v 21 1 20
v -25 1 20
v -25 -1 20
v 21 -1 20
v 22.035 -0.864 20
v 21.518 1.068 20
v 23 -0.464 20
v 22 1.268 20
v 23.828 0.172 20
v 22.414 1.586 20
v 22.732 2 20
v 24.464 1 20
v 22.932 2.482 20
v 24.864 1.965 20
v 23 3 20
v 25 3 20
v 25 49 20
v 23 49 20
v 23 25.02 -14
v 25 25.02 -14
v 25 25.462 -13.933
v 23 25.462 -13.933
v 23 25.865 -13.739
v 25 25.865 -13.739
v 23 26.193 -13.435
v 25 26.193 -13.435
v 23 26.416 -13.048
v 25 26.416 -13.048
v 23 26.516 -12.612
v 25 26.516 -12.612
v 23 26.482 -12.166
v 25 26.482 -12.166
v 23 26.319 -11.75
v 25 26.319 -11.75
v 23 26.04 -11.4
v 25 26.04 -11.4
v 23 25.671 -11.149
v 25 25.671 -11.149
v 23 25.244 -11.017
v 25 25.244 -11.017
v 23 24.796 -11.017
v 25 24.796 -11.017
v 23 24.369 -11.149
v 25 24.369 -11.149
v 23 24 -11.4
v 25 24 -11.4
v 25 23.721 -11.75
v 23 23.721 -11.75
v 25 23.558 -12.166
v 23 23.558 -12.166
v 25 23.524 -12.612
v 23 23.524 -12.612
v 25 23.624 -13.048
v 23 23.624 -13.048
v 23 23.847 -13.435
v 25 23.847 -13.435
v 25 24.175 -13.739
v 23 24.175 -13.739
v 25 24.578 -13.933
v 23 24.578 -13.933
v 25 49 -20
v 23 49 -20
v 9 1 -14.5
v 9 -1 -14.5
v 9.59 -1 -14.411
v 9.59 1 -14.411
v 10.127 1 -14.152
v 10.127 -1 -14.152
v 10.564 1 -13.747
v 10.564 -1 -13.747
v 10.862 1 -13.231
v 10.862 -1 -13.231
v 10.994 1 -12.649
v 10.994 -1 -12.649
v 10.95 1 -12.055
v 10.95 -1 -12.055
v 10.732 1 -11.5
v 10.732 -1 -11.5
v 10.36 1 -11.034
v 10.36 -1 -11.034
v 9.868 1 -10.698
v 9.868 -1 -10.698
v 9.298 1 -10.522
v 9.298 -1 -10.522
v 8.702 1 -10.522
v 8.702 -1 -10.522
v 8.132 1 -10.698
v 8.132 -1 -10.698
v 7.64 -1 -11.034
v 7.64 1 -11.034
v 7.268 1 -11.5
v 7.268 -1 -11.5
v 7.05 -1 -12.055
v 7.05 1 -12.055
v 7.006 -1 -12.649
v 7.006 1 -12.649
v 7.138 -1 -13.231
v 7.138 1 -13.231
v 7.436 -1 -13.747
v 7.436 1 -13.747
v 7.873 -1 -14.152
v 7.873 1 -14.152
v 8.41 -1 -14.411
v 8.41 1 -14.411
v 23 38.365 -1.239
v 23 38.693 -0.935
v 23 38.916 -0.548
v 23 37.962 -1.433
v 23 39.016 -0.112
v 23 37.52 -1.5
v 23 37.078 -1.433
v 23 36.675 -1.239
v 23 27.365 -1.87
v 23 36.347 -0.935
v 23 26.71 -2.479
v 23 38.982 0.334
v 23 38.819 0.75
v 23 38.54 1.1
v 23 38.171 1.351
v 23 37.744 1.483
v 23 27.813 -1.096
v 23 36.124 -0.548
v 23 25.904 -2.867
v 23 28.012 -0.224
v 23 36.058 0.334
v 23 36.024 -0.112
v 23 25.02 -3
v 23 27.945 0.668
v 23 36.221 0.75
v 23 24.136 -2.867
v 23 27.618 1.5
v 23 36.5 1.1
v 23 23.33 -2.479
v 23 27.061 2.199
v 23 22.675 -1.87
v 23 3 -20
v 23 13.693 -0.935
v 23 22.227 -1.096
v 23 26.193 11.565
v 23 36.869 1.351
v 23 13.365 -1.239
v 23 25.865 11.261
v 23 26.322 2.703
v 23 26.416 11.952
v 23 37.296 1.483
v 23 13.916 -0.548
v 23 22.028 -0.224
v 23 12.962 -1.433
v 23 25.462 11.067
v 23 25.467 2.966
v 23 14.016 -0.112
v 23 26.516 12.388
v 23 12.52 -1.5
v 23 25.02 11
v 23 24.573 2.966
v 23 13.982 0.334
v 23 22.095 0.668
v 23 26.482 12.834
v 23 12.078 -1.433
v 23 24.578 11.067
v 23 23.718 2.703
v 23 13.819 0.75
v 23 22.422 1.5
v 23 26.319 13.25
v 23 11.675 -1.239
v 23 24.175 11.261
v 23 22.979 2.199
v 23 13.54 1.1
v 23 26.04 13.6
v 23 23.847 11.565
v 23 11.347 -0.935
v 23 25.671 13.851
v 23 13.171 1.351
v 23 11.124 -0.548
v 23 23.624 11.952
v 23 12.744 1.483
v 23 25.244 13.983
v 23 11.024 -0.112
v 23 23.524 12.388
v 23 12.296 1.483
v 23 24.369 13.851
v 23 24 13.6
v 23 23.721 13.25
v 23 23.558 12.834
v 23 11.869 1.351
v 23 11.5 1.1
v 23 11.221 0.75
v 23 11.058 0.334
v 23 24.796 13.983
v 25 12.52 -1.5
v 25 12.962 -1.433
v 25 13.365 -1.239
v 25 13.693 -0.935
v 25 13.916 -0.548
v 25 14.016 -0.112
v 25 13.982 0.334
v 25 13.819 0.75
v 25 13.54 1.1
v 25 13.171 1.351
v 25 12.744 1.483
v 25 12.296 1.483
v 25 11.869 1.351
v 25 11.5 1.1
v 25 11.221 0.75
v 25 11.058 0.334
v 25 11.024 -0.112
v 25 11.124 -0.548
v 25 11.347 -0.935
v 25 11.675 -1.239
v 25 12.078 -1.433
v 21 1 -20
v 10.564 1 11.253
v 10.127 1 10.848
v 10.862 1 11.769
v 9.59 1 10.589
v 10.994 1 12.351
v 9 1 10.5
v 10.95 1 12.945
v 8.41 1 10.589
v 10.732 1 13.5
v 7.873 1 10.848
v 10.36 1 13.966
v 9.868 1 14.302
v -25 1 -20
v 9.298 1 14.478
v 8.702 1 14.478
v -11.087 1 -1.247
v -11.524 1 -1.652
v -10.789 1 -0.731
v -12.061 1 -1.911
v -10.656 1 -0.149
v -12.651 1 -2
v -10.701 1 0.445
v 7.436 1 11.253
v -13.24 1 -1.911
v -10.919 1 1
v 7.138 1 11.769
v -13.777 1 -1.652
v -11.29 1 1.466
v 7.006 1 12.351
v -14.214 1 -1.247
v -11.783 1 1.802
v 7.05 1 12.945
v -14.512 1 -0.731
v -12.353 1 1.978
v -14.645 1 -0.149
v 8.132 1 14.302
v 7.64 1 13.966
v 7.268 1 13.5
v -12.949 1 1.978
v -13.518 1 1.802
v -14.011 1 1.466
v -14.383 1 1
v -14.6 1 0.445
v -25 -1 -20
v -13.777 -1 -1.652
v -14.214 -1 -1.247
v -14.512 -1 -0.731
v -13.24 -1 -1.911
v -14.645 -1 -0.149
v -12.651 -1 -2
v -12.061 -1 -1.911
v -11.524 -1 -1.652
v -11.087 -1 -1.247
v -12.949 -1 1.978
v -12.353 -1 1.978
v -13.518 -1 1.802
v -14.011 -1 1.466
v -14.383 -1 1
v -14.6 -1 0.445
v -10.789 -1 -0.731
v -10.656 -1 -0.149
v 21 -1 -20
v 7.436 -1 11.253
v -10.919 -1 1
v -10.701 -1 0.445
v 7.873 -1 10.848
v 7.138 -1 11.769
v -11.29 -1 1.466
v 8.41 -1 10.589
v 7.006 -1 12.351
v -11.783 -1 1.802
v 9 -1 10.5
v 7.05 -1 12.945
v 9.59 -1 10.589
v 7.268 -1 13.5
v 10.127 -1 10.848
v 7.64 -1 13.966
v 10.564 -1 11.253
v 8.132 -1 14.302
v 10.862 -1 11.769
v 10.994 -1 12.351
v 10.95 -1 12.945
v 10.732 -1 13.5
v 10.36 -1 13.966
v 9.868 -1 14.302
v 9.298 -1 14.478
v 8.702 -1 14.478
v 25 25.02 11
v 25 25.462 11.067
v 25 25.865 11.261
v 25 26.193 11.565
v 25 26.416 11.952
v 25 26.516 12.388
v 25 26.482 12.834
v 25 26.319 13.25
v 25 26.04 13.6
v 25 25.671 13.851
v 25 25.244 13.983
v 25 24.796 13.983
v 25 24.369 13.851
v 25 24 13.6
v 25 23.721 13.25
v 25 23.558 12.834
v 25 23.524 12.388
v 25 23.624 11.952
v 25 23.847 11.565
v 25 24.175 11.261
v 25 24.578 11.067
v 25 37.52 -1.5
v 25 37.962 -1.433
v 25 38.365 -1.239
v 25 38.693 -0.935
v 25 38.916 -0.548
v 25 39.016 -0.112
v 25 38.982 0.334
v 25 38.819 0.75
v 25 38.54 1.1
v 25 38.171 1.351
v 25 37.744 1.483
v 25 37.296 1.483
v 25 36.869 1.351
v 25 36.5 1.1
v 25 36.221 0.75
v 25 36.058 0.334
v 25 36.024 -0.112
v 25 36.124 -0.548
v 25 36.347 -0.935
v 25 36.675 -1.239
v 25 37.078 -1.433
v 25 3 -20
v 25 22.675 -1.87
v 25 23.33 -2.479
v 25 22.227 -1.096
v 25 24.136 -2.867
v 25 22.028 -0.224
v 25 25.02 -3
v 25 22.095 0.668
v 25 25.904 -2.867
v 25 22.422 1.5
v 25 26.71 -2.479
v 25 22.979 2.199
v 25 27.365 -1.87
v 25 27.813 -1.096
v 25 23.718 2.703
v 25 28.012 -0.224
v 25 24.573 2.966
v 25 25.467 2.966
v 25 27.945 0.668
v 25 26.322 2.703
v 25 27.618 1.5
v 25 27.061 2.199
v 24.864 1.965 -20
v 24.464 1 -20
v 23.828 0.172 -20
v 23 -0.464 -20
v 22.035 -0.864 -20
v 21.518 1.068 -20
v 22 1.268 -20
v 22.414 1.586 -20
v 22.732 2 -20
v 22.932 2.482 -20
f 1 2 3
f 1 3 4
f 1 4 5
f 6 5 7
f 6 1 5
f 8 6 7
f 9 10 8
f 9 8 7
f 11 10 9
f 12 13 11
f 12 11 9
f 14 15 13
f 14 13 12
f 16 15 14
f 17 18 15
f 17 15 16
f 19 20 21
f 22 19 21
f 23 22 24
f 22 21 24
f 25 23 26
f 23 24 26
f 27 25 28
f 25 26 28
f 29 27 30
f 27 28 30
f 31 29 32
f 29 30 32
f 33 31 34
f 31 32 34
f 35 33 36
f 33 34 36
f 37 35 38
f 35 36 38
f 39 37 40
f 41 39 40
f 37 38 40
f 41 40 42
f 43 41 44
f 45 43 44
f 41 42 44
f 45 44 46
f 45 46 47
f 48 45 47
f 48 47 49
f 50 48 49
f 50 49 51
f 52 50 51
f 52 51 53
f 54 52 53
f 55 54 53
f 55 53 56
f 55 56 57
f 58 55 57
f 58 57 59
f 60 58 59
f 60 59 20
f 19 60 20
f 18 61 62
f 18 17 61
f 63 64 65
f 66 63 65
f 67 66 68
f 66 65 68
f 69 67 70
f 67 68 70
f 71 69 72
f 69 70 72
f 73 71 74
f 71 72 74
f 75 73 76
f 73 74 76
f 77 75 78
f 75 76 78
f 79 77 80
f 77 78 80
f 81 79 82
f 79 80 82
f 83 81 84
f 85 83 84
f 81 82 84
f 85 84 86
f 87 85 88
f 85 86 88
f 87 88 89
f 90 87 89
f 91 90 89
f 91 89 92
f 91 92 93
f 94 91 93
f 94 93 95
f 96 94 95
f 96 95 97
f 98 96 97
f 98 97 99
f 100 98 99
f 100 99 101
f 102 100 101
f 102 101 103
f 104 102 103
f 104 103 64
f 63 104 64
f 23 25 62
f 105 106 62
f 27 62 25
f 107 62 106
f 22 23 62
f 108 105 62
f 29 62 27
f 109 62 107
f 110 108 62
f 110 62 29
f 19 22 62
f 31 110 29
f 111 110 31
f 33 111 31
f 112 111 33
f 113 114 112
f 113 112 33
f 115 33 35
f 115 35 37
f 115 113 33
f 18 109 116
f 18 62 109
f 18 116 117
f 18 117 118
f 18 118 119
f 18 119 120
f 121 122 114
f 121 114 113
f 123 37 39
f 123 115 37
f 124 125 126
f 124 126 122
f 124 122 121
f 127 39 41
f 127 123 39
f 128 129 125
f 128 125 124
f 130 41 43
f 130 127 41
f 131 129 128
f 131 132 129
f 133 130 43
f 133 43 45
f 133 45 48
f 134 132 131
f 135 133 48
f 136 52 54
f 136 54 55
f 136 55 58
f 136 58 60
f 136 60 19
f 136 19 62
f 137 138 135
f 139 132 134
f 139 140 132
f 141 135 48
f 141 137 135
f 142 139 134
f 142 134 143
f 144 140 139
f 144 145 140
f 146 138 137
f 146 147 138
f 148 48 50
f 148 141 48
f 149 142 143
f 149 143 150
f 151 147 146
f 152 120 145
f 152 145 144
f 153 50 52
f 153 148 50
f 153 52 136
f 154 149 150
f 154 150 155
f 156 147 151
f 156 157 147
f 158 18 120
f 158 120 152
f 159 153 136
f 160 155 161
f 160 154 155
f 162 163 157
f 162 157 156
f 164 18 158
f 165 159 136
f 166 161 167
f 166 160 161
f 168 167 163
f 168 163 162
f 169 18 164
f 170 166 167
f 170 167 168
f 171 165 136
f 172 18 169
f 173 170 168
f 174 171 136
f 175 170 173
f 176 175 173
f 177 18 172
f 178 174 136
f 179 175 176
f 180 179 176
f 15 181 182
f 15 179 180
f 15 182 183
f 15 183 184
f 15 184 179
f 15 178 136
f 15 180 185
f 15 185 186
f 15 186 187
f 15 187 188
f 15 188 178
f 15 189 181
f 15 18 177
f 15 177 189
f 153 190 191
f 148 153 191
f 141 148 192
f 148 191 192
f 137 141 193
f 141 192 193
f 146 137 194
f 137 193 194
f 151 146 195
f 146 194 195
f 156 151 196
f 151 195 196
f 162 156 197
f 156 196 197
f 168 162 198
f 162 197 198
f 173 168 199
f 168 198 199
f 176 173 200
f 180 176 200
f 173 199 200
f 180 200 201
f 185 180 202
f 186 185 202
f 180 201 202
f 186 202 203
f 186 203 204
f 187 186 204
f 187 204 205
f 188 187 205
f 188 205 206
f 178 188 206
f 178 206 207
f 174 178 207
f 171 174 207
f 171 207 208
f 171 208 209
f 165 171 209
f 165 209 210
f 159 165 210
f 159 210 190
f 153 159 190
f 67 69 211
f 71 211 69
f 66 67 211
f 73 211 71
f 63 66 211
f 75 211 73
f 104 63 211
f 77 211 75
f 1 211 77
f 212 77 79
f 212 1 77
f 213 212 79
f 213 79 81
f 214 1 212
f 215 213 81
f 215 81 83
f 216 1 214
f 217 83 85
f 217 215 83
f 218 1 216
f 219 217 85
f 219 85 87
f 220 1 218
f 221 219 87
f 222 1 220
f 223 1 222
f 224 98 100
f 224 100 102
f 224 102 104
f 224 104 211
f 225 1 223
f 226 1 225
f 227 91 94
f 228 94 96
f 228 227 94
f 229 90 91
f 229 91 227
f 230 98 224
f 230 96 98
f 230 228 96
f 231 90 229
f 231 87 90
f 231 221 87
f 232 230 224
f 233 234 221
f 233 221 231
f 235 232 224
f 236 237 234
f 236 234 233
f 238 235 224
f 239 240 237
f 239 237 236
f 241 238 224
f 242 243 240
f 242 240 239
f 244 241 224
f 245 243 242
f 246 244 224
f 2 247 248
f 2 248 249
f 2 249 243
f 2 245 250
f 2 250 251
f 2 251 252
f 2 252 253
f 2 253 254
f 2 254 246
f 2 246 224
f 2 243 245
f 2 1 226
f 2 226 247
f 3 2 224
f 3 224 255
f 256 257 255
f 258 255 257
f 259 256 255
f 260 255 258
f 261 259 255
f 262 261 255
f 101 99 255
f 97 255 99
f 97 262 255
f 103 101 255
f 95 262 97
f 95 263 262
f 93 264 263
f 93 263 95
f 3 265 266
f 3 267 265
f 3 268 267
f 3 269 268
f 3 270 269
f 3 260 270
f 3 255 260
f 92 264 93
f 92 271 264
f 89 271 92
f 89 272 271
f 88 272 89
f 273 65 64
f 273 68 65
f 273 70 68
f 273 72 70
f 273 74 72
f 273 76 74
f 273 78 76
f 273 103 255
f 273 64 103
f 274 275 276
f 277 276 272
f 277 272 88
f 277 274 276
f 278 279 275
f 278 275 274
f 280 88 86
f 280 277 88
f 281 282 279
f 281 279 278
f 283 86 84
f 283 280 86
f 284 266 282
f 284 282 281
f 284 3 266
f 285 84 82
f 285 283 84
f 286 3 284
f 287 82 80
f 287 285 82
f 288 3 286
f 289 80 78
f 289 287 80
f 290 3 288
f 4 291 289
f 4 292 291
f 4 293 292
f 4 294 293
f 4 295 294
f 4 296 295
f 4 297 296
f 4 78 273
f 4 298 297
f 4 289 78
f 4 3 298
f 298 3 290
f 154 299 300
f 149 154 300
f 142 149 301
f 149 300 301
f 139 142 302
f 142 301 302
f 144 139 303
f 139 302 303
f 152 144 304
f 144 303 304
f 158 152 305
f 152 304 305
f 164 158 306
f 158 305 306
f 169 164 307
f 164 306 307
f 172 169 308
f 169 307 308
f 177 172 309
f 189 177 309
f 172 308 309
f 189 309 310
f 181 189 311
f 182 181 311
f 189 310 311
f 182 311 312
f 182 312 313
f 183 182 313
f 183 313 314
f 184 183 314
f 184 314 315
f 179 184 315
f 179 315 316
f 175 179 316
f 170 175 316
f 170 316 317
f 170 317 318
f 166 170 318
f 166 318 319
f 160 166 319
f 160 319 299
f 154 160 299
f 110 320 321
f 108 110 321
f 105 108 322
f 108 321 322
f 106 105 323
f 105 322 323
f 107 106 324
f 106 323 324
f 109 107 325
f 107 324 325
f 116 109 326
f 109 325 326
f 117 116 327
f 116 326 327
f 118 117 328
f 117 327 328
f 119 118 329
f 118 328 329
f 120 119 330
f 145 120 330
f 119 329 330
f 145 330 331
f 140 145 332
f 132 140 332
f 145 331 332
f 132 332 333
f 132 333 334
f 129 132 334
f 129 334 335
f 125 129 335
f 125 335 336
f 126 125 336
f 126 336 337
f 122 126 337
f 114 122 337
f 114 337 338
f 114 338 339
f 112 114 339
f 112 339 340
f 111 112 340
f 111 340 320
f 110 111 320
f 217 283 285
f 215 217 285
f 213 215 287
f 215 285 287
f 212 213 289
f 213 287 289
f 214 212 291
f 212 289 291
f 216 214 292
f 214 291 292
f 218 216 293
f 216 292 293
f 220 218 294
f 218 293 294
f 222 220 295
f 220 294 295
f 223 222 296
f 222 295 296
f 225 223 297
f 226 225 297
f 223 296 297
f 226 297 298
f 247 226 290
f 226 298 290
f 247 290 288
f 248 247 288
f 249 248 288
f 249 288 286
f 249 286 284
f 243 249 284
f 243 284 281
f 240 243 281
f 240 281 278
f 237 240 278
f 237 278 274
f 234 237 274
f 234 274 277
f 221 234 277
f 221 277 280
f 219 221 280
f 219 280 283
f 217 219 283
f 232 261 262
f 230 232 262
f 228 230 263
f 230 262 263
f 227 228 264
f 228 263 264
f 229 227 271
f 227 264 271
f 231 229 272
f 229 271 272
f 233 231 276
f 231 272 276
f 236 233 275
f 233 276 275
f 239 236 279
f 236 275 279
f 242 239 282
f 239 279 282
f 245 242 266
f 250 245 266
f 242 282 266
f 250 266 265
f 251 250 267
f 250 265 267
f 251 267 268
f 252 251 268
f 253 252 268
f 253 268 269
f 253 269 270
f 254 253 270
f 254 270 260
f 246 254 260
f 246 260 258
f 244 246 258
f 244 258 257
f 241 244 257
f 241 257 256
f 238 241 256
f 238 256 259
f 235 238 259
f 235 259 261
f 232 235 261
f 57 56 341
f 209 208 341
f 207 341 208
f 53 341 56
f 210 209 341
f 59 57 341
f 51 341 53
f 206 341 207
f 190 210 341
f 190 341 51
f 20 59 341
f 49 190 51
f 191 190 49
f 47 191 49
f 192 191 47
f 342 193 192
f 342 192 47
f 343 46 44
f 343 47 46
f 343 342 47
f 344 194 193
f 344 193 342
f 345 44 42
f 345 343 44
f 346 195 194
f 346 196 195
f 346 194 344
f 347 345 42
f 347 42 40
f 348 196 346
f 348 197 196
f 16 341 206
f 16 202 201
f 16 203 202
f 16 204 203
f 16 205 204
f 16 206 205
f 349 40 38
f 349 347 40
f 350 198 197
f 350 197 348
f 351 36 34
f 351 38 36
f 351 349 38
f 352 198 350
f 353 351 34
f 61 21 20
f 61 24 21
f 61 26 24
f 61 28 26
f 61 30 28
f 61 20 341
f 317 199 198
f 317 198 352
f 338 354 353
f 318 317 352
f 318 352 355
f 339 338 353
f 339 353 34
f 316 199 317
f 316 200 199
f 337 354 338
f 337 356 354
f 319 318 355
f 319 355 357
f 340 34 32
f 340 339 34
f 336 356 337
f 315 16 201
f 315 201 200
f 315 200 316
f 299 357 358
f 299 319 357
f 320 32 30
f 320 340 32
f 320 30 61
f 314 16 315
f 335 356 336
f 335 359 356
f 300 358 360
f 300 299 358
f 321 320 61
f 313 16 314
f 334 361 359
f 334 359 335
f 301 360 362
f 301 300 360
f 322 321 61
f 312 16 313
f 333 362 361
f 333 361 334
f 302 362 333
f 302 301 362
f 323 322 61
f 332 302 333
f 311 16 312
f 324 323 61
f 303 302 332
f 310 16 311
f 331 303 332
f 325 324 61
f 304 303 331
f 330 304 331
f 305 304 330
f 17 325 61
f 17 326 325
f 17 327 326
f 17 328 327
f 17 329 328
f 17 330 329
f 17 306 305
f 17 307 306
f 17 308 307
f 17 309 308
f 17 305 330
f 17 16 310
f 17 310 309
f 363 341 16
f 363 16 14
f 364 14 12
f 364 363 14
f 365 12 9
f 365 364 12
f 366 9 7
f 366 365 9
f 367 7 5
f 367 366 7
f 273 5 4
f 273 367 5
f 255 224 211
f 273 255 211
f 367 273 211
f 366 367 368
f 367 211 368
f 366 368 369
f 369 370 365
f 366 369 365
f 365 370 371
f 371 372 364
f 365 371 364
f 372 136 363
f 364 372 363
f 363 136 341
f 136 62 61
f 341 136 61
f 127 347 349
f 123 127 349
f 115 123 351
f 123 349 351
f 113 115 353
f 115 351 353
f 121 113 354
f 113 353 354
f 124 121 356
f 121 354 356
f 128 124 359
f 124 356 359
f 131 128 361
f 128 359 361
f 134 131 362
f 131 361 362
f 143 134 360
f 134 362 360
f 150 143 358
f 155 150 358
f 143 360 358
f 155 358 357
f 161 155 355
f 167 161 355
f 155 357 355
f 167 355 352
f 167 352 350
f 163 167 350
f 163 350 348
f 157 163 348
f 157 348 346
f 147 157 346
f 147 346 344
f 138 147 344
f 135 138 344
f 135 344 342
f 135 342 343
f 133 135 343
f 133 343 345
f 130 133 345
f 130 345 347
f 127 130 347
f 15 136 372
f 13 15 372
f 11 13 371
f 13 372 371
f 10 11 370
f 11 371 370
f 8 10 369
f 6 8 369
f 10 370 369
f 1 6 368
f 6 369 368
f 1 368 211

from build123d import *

# Parameters (mm, degrees)
RESSALTO_EXTRUS_O1_DEPTH  = 20
ESBO_O2_R                 = 3
CORTE_EXTRUS_O1_DEPTH     = 50
CONVERTER_S_LIDO1_START   = -21
CONVERTER_S_LIDO1_DEPTH   = 41
CONVERTER_S_LIDO1_START_2 = -20
CONVERTER_S_LIDO1_2_DEPTH = 40
ESBO_O3_R                 = 2
CORTE_EXTRUS_O2_DEPTH     = 10
ESBO_O4_R                 = 1.5
CORTE_EXTRUS_O3_DEPTH     = 8


with BuildPart() as part:
    # Esboço1 → Ressalto-extrusão1 (new, symmetric)
    with BuildSketch(Plane.XY):
        Polygon((23, 49), (23, 1), (-25, 1), (-25, -1), (23, -1), (25, -1), (25, 1), (25, 49), align=None)
    extrude(amount=RESSALTO_EXTRUS_O1_DEPTH, both=True)

    # Esboço2 → Corte-extrusão1 (cut)
    with BuildSketch(Plane(origin=(25, 0, 0), x_dir=(0, 0, -1), z_dir=(1, 0, 0))):
        with Locations((0, 25.02)):
            Circle(ESBO_O2_R)
    extrude(amount=-CORTE_EXTRUS_O1_DEPTH, mode=Mode.SUBTRACT)

    # Converter-Sólido1: read off the stored shape, not the designer's step
    # Converter-Sólido1 outline → Converter-Sólido1 (cut)
    with BuildSketch(Plane.XY.offset(CONVERTER_S_LIDO1_START)):
        with BuildLine():
            Line((25, -1), (25, 3))
            ThreePointArc((25, 3), (23.828427125, 0.171572875), (21, -1))
            Line((21, -1), (25, -1))
        make_face()
    extrude(amount=CONVERTER_S_LIDO1_DEPTH, mode=Mode.SUBTRACT)

    # Converter-S_lido1 2 outline → Converter-S_lido1 2 (add)
    with BuildSketch(Plane.XY.offset(CONVERTER_S_LIDO1_START_2)):
        with BuildLine():
            Line((23, 1), (23, 3))
            ThreePointArc((23, 3), (22.414213562, 1.585786438), (21, 1))
            Line((21, 1), (23, 1))
        make_face()
    extrude(amount=CONVERTER_S_LIDO1_2_DEPTH)

    # Esboço3 → Corte-extrusão2 (cut)
    with BuildSketch(Plane.XZ.offset(1)):
        with Locations(Location((9, 12.5, 0), (0, 0, 270))):
            Circle(ESBO_O3_R)
        with Locations(Location((9, -12.5, 0), (0, 0, 270))):
            Circle(ESBO_O3_R)
        with Locations(Location((-12.650635095, 0, 0), (0, 0, 270))):
            Circle(ESBO_O3_R)
    extrude(amount=-CORTE_EXTRUS_O2_DEPTH, mode=Mode.SUBTRACT)

    # Esboço4 → Corte-extrusão3 (cut)
    with BuildSketch(Plane(origin=(25, 0, 0), x_dir=(0, 0, -1), z_dir=(1, 0, 0))):
        with Locations((0, 37.52)):
            Circle(ESBO_O4_R)
        with Locations((12.5, 25.02)):
            Circle(ESBO_O4_R)
        with Locations((0, 12.52)):
            Circle(ESBO_O4_R)
        with Locations((-12.5, 25.02)):
            Circle(ESBO_O4_R)
    extrude(amount=-CORTE_EXTRUS_O3_DEPTH, mode=Mode.SUBTRACT)


solid = part.part
